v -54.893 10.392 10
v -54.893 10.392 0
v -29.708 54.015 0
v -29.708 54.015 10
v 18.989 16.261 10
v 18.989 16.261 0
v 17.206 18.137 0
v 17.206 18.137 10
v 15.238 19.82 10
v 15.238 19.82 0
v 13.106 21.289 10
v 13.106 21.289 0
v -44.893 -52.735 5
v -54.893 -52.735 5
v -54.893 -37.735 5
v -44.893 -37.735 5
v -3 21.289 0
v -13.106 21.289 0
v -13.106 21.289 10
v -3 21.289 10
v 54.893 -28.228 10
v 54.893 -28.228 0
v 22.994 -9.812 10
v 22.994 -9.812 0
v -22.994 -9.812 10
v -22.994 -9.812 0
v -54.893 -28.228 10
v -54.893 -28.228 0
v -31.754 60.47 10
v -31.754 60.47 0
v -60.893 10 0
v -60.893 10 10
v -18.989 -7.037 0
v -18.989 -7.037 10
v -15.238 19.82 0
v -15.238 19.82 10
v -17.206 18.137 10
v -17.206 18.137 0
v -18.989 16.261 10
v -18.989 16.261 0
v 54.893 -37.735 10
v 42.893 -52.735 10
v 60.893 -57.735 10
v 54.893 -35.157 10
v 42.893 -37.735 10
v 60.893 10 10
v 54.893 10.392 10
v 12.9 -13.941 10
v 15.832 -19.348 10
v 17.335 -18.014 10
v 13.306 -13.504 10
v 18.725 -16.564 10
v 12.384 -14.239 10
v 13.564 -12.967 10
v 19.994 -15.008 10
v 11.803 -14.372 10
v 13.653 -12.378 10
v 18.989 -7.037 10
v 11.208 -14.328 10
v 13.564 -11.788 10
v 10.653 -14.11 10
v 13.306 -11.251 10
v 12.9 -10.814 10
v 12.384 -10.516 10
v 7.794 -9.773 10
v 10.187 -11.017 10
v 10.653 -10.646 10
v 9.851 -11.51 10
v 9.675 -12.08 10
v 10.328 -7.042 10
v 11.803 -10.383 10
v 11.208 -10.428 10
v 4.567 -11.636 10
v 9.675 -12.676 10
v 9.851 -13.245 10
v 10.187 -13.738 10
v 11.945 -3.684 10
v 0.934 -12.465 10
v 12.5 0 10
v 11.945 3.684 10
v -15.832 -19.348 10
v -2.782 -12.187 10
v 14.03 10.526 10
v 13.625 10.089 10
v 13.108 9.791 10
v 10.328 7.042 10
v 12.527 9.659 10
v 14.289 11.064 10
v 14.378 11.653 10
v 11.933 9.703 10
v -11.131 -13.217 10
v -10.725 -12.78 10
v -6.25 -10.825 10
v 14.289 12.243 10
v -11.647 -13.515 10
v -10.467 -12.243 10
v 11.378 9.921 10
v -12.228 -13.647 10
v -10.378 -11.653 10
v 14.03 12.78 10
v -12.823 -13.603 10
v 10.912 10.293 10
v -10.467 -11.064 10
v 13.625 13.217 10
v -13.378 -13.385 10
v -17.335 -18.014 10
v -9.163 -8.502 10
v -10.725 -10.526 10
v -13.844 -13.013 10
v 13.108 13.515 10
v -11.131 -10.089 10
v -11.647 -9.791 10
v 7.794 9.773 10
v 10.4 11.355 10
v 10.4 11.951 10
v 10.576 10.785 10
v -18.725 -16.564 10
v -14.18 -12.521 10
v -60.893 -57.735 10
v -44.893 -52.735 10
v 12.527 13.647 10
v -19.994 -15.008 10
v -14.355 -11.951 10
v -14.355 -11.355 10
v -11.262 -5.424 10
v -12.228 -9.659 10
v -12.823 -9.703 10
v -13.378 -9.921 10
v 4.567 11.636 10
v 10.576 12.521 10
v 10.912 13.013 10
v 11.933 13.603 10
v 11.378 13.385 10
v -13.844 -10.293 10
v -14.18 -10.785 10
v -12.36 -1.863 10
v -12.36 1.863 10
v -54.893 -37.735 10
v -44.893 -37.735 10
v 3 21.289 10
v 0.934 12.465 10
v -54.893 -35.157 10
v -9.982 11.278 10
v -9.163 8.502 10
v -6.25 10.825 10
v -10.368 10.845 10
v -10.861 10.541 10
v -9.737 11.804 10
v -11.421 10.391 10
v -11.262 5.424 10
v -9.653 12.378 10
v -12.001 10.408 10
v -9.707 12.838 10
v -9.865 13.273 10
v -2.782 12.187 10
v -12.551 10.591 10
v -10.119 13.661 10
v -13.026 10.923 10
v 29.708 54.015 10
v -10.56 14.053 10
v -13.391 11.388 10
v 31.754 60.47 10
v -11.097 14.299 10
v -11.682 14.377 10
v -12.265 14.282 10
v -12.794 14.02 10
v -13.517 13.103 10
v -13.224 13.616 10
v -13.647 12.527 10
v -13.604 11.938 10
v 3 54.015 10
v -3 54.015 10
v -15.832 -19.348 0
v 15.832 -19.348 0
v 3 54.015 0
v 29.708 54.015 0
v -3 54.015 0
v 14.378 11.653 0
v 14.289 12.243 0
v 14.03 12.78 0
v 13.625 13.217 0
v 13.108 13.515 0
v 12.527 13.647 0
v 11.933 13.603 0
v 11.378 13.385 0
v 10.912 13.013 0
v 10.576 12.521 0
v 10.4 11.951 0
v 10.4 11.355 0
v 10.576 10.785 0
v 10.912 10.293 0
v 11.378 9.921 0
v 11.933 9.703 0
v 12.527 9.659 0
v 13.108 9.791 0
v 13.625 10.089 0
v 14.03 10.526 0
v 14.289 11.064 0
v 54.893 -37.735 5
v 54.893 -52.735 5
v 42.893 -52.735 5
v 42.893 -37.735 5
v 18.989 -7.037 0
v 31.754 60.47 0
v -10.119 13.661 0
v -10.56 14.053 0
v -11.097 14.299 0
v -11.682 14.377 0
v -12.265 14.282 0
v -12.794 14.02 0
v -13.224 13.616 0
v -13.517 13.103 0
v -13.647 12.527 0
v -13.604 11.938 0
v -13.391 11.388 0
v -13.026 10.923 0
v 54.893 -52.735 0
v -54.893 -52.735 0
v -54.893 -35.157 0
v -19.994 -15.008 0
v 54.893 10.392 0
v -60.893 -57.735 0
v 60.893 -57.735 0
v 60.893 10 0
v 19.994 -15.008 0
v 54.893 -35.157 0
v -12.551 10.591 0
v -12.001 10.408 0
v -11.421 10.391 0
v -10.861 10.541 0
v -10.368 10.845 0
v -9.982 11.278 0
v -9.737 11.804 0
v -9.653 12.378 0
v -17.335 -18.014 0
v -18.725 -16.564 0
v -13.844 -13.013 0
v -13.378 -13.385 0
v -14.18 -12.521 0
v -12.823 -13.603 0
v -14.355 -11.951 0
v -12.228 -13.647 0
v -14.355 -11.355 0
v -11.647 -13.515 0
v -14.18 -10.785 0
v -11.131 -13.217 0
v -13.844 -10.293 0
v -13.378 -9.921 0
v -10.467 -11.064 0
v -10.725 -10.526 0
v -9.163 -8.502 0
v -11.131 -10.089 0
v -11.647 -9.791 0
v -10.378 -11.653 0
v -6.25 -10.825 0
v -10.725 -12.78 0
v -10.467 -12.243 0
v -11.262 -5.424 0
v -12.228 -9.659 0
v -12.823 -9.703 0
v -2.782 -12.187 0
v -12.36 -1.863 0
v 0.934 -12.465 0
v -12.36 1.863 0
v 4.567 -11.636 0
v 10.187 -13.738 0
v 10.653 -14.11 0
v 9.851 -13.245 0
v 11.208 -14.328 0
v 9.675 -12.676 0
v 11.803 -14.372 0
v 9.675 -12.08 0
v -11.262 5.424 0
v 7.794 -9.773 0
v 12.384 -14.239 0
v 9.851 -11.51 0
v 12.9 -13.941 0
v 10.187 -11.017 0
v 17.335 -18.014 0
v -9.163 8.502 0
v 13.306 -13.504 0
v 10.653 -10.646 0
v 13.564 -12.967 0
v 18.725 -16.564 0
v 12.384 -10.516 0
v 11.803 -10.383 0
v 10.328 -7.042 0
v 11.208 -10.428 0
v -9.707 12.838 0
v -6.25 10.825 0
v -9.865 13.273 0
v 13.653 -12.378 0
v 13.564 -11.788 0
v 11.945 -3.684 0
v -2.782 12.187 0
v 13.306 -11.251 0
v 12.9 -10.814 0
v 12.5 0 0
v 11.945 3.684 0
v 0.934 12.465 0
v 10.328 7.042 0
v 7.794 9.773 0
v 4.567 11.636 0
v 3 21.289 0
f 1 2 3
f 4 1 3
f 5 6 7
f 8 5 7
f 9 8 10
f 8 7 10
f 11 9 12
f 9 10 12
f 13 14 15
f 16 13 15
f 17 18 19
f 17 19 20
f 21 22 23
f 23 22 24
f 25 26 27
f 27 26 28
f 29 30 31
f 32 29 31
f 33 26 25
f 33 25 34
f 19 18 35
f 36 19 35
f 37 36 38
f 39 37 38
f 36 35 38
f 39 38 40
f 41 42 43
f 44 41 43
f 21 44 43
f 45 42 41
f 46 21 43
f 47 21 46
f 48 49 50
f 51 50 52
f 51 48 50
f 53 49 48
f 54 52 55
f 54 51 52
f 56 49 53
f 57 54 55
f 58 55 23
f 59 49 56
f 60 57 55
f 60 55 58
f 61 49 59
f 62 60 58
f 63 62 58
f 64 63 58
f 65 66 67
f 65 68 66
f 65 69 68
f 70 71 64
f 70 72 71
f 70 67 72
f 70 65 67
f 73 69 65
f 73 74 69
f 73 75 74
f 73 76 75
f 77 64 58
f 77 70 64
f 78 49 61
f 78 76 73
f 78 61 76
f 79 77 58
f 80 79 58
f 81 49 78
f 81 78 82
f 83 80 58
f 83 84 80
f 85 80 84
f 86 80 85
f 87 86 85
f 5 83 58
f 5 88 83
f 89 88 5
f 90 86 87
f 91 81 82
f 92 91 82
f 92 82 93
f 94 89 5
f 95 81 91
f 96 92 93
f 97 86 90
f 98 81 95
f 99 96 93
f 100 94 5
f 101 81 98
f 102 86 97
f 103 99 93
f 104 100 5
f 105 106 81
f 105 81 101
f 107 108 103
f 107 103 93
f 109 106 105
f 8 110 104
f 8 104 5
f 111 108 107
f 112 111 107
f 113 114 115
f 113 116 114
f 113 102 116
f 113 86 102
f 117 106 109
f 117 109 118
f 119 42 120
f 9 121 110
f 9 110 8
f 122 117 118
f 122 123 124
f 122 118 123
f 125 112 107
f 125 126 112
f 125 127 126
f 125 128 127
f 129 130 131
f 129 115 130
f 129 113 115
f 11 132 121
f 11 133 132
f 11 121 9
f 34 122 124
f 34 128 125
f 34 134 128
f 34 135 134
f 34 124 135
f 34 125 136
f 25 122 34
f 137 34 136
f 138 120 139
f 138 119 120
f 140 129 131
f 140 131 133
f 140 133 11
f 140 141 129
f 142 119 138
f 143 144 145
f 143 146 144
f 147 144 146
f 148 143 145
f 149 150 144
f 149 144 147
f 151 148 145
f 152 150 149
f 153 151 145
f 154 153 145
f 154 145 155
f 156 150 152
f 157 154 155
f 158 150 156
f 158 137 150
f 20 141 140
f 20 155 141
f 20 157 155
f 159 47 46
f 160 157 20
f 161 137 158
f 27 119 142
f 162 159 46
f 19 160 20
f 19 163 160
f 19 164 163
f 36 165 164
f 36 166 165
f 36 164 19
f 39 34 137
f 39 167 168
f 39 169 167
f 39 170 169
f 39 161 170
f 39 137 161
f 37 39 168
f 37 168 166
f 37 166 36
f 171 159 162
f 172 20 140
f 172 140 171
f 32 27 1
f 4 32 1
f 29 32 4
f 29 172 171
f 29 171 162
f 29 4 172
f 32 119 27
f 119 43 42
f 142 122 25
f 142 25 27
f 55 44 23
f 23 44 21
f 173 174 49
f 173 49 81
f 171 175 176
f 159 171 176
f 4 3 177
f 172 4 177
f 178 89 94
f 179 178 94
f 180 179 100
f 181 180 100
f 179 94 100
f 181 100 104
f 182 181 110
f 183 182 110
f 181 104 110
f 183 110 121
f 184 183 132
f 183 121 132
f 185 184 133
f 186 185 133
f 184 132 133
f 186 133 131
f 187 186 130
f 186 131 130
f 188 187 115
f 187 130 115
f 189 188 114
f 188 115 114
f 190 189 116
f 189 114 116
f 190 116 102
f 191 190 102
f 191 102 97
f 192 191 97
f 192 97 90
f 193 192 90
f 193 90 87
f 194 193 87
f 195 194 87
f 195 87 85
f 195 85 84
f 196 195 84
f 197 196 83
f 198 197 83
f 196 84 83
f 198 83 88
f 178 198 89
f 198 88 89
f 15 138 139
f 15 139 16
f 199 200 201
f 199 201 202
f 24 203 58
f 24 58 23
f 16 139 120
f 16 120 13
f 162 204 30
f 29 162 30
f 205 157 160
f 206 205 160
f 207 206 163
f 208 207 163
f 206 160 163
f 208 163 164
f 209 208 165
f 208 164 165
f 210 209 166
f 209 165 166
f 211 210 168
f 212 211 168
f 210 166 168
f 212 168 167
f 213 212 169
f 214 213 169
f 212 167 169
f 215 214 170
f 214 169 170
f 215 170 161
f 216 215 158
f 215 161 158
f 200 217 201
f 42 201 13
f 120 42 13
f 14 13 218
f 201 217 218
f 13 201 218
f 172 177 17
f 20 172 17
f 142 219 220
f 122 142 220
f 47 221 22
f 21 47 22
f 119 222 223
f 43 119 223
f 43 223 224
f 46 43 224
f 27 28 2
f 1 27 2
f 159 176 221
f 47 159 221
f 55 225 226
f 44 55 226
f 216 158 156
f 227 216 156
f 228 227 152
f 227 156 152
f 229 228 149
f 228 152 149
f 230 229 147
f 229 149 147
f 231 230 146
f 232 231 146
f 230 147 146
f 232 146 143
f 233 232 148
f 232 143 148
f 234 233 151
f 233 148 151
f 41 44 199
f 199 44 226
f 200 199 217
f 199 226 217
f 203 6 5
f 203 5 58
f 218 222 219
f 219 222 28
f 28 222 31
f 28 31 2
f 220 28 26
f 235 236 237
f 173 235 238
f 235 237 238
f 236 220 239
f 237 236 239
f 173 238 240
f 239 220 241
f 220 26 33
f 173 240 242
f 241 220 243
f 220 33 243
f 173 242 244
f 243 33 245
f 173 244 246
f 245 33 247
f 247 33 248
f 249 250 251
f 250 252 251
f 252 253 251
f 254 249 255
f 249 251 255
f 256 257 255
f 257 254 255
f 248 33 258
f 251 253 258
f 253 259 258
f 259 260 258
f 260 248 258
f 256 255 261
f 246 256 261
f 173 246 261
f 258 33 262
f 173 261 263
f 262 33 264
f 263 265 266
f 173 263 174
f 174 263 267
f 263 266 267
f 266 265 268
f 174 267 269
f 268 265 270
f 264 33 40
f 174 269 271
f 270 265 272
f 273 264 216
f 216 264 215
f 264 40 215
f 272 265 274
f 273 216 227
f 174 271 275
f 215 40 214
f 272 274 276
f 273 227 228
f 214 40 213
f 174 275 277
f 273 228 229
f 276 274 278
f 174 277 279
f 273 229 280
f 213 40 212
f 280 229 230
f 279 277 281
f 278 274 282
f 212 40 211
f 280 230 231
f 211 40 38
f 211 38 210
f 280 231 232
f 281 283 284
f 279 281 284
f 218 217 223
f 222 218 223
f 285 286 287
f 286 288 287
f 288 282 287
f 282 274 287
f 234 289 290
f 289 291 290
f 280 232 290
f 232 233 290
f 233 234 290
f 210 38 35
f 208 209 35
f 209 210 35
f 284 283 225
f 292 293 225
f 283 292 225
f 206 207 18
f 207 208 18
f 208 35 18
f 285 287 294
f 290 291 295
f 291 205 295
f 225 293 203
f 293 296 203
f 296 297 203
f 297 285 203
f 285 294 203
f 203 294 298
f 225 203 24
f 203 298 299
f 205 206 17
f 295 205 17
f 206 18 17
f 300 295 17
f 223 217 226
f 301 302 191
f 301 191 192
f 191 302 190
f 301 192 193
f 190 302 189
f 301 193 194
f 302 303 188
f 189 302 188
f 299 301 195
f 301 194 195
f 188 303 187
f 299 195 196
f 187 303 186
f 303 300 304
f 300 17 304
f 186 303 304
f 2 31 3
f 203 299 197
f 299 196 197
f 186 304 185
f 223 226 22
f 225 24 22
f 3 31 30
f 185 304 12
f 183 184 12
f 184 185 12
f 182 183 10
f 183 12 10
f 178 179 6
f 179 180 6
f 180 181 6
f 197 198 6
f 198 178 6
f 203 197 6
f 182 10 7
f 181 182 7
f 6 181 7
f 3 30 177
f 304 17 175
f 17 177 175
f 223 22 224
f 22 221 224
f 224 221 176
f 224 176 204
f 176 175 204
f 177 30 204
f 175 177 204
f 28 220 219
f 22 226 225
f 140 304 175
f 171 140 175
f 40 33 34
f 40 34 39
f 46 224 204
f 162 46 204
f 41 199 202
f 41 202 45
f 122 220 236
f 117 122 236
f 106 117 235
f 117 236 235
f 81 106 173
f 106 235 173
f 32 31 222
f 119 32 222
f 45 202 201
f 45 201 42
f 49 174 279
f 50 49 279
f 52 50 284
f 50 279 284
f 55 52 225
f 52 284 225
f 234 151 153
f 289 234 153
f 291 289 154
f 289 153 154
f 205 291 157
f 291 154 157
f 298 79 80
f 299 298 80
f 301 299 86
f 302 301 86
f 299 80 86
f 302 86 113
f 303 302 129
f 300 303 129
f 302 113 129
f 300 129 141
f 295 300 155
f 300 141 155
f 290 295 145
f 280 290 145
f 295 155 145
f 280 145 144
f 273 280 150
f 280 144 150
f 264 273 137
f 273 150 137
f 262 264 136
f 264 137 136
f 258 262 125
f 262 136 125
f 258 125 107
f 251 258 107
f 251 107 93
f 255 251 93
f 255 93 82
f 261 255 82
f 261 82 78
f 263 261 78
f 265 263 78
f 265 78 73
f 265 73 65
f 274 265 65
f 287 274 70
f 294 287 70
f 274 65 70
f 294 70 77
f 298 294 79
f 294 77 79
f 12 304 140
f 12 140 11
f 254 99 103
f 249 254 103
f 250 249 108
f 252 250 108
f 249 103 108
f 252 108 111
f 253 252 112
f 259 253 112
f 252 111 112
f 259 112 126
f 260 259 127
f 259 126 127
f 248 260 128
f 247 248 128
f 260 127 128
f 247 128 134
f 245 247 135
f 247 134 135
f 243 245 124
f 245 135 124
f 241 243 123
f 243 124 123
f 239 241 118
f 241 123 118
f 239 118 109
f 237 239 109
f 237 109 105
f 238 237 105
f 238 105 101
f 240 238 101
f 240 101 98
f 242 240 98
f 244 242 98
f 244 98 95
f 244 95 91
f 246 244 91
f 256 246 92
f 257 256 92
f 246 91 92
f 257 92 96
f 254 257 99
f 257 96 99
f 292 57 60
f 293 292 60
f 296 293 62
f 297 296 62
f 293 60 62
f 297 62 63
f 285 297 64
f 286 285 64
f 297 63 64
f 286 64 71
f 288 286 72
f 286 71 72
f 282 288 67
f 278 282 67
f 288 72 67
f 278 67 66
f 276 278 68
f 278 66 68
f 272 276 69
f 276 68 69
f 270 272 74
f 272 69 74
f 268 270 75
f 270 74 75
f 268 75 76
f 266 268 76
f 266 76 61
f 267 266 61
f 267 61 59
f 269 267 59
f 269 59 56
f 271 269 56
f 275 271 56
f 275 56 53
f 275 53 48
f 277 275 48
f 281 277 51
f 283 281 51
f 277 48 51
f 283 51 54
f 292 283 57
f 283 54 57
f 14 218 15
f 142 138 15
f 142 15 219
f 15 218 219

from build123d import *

# Parameters (mm, degrees)
BOSS_EXTRUDE1_DEPTH = 10
SKETCH4_R           = 2
CUT_EXTRUDE1_DEPTH  = 10
CUT_EXTRUDE2_START  = -10
CUT_EXTRUDE2_DEPTH  = 10
SKETCH4_5_R         = 12.5
CUT_EXTRUDE3_DEPTH  = 10
CUT_EXTRUDE4_START  = -10
CUT_EXTRUDE4_DEPTH  = 10
SKETCH5_W           = 5
SKETCH5_H           = 15
BOSS_EXTRUDE2_DEPTH = 10
SKETCH7_W           = 5
SKETCH7_H           = 15
BOSS_EXTRUDE4_DEPTH = 12


with BuildPart() as part:
    # Sketch2 → Boss-Extrude1 (new body)
    with BuildSketch(Plane.XY):
        Polygon((-31.754264805, 60.470053838), (-60.893163975, 10), (-60.893163975, -57.735026919), (60.893163975, -57.735026919), (60.893163975, 10), (31.754264805, 60.470053838), align=None)
        with BuildLine():
            Line((-54.893163975, 10.392304845), (-29.707782181, 54.014665721))
            Line((-29.707782181, 54.014665721), (-3, 54.014665721))
            Line((-3, 54.014665721), (-3, 24.819347292))
            ThreePointArc((-3, 24.819347292), (-21.650635095, 12.5), (-22.99418526, -9.811597435))
            Line((-22.99418526, -9.811597435), (-54.893163975, -28.228481382))
            Line((-54.893163975, -28.228481382), (-54.893163975, 10.392304845))
        make_face(mode=Mode.SUBTRACT)
        with BuildLine():
            Line((-54.893163975, -35.156684613), (-19.99418526, -15.007749857))
            ThreePointArc((-19.99418526, -15.007749857), (0, -25), (19.99418526, -15.007749857))
            Line((19.99418526, -15.007749857), (54.893163975, -35.156684613))
            Line((54.893163975, -35.156684613), (54.893163975, -52.735026919))
            Line((54.893163975, -52.735026919), (-54.893163975, -52.735026919))
            Line((-54.893163975, -52.735026919), (-54.893163975, -35.156684613))
        make_face(mode=Mode.SUBTRACT)
        with BuildLine():
            Line((54.893163975, -28.228481382), (22.99418526, -9.811597435))
            ThreePointArc((22.99418526, -9.811597435), (24.493413722, -5.007263149), (25, 0))
            Line((25, 0), (24.879996994, 2.446579159))
            ThreePointArc((24.879996994, 2.446579159), (17.873408924, 17.479738368), (3, 24.819347292))
            Line((3, 24.819347292), (3, 54.014665721))
            Line((3, 54.014665721), (29.707782181, 54.014665721))
            Line((29.707782181, 54.014665721), (54.893163975, 10.392304845))
            Line((54.893163975, 10.392304845), (54.893163975, -28.228481382))
        make_face(mode=Mode.SUBTRACT)
    extrude(amount=BOSS_EXTRUDE1_DEPTH)

    # Sketch4 → Cut-Extrude1 (cut)
    with BuildSketch(Plane.XY.offset(10)):
        with Locations((-12.377645895, -11.653063206)):
            Circle(SKETCH4_R)
        with Locations((-11.653063206, 12.377645895)):
            Circle(SKETCH4_R)
        with Locations((11.653063206, -12.377645895)):
            Circle(SKETCH4_R)
        with Locations((12.377645895, 11.653063206)):
            Circle(SKETCH4_R)
    extrude(amount=-CUT_EXTRUDE1_DEPTH, mode=Mode.SUBTRACT)

    # Sketch4<4> → Cut-Extrude2 (cut)
    with BuildSketch(Plane.XY.offset(10).offset(CUT_EXTRUDE2_START)):
        with BuildLine():
            Line((-18.989077055, -7.037341973), (-18.989077055, 16.260841079))
            ThreePointArc((-18.989077055, 16.260841079), (-24.443440144, 5.245782491), (-23.989077055, -7.037341973))
            Line((-23.989077055, -7.037341973), (-18.989077055, -7.037341973))
        make_face()
        with BuildLine():
            Line((-13.106268079, 21.289099019), (-3, 21.289099019))
            Line((-3, 21.289099019), (-3, 24.819347292))
            ThreePointArc((-3, 24.819347292), (-8.244309011, 23.601512005), (-13.106268079, 21.289099019))
        make_face()
        with BuildLine():
            Line((3, 24.819347292), (3, 21.289099019))
            Line((3, 21.289099019), (13.106268079, 21.289099019))
            ThreePointArc((13.106268079, 21.289099019), (8.244309011, 23.601512005), (3, 24.819347292))
        make_face()
        with BuildLine():
            ThreePointArc((24.879996994, 2.446579159), (22.996355637, 9.806509441), (18.989077055, 16.260841079))
            Line((18.989077055, 16.260841079), (18.989077055, -7.037341973))
            Line((18.989077055, -7.037341973), (23.989077055, -7.037341973))
            ThreePointArc((23.989077055, -7.037341973), (24.745978728, -3.554790685), (25, 0))
            Line((25, 0), (24.879996994, 2.446579159))
        make_face()
        with BuildLine():
            Line((15.832343221, -19.347788198), (-15.832343221, -19.347788198))
            ThreePointArc((-15.832343221, -19.347788198), (0, -25), (15.832343221, -19.347788198))
        make_face()
    extrude(amount=CUT_EXTRUDE2_DEPTH, mode=Mode.SUBTRACT)

    # Sketch4<5> → Cut-Extrude3 (cut)
    with BuildSketch(Plane.XY.offset(10)):
        Circle(SKETCH4_5_R)
    extrude(amount=-CUT_EXTRUDE3_DEPTH, mode=Mode.SUBTRACT)

    # Sketch4<6> → Cut-Extrude4 (cut)
    with BuildSketch(Plane.XY.offset(10).offset(CUT_EXTRUDE4_START)):
        with BuildLine():
            Line((-22.99418526, -9.811597435), (-18.989077055, -7.037341973))
            Line((-18.989077055, -7.037341973), (-23.989077055, -7.037341973))
            ThreePointArc((-23.989077055, -7.037341973), (-23.532548901, -8.439143452), (-22.99418526, -9.811597435))
        make_face()
        with BuildLine():
            Line((23.989077055, -7.037341973), (18.989077055, -7.037341973))
            Line((18.989077055, -7.037341973), (22.99418526, -9.811597435))
            ThreePointArc((22.99418526, -9.811597435), (23.532548901, -8.439143452), (23.989077055, -7.037341973))
        make_face()
    extrude(amount=CUT_EXTRUDE4_DEPTH, mode=Mode.SUBTRACT)

    # Sketch5 → Boss-Extrude2 (add)
    with BuildSketch(Plane(origin=(-54.893163975, 0, 0), x_dir=(0, 0, -1), z_dir=(1, 0, 0))):
        with Locations((-7.5, -45.235026919)):
            Rectangle(SKETCH5_W, SKETCH5_H)
    extrude(amount=BOSS_EXTRUDE2_DEPTH)

    # Sketch7 → Boss-Extrude4 (add)
    with BuildSketch(Plane.ZY.offset(-54.893163975)):
        with Locations((7.5, -45.235026919)):
            Rectangle(SKETCH7_W, SKETCH7_H)
    extrude(amount=BOSS_EXTRUDE4_DEPTH)


solid = part.part
